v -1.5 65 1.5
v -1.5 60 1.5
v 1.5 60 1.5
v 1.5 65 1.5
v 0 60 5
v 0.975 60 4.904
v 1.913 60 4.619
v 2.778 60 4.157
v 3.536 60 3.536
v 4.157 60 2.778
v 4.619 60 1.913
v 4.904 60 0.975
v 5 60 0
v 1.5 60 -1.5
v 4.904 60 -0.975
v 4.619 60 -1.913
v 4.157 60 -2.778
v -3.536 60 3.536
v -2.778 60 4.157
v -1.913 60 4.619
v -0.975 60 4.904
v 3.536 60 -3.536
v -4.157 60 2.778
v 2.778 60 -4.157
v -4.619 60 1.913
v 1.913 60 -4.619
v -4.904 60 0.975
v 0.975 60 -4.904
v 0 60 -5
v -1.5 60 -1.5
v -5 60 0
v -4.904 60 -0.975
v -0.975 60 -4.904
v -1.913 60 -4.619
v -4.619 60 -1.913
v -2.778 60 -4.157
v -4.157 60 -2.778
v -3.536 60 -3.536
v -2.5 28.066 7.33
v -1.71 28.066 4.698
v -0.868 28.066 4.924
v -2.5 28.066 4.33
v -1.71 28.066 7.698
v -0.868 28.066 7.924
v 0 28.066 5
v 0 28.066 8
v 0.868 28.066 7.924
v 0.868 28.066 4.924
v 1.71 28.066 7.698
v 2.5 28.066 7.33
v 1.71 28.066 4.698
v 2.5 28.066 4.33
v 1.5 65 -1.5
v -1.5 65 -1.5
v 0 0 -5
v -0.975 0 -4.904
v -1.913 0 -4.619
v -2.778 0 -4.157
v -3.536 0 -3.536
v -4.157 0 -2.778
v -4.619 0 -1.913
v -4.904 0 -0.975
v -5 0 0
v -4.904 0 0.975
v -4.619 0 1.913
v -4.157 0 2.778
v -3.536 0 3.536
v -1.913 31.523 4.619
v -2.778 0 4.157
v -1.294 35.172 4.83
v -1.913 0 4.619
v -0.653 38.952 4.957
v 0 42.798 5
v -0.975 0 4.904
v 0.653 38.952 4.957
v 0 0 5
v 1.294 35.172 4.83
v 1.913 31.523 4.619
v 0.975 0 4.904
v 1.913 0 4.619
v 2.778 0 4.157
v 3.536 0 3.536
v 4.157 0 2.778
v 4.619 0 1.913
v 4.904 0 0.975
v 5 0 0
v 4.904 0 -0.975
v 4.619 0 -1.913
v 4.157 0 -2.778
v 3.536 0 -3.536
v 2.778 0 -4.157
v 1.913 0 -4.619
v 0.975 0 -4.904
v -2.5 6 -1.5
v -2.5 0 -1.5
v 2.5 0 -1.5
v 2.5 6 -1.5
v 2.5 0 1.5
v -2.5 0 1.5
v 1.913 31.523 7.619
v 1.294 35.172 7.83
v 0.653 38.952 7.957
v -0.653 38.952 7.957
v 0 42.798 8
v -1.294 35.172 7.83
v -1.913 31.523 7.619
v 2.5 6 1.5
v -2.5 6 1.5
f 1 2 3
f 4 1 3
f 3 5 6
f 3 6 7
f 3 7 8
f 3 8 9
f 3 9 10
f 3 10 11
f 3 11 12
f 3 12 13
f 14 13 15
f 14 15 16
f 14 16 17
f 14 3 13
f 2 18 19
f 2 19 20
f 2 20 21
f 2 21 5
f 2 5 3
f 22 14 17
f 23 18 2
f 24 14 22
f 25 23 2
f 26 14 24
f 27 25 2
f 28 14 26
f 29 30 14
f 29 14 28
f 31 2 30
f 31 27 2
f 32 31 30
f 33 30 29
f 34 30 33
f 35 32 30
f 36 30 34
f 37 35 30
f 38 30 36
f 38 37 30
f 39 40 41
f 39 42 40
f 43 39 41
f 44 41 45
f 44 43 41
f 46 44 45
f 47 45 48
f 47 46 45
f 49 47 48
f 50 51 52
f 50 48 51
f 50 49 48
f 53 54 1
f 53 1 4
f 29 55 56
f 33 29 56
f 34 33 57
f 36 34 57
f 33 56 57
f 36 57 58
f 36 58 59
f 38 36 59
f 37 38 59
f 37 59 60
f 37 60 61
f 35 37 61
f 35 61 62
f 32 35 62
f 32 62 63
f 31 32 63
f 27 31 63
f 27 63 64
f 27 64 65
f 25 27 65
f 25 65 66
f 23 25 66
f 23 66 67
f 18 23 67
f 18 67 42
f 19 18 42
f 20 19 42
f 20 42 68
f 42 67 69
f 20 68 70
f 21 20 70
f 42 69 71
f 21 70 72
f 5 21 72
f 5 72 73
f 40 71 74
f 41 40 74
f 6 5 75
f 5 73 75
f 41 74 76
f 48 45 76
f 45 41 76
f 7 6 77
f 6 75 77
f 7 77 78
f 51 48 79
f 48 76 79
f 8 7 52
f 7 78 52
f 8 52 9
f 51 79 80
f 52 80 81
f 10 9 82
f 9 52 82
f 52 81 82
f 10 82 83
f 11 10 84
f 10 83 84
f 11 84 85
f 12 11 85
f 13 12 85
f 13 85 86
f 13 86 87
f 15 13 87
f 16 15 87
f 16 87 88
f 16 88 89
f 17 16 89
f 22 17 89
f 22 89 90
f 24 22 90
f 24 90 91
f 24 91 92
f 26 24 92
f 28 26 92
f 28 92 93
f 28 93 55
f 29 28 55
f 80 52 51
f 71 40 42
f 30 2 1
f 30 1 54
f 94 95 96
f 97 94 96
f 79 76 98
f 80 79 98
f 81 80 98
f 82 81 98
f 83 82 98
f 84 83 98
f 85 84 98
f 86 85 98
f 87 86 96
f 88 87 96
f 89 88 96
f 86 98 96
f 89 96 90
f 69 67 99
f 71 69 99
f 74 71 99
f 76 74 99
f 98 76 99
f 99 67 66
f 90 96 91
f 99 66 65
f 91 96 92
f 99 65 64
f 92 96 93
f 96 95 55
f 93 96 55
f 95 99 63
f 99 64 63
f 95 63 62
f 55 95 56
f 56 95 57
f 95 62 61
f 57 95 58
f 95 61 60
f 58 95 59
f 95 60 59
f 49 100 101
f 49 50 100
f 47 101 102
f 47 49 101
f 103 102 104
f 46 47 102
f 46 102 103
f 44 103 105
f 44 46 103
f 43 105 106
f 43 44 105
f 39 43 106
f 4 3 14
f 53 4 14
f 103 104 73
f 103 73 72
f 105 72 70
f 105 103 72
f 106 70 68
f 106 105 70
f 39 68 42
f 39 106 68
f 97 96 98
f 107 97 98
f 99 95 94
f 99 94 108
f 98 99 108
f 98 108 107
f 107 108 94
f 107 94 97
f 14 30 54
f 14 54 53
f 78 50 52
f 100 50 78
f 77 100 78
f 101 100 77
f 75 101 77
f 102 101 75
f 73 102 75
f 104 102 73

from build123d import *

# Parameters (mm, degrees)
SKETCH1_R                  = 5
BOSS_EXTRUDE1_DEPTH        = 60
SKETCH2_W                  = 5
SKETCH2_H                  = 3
CUT_EXTRUDE1_DEPTH         = 6
BOSS_EXTRUDE2_REACH        = 65.415
BOSS_EXTRUDE2_START_RADIUS = 5
BOSS_EXTRUDE2_END_RADIUS   = 5
SKETCH4_W                  = 3
SKETCH4_H                  = 3
BOSS_EXTRUDE3_DEPTH        = 5


with BuildPart() as part:
    # Sketch1 → Boss-Extrude1 (new body)
    with BuildSketch(Plane(origin=(0, 0, 0), x_dir=(1, 0, 0), z_dir=(0, 1, 0))):
        Circle(SKETCH1_R)
    extrude(amount=BOSS_EXTRUDE1_DEPTH)

    # Sketch2 → Cut-Extrude1 (cut)
    with BuildSketch(Plane.XZ):
        Rectangle(SKETCH2_W, SKETCH2_H)
    extrude(amount=-CUT_EXTRUDE1_DEPTH, mode=Mode.SUBTRACT)

    # Boss-Extrude2: from a cylinder face, 65.415 long prism both ways, kept between that surface and its translate by the depth
    boss_extrude2_start = Plane(origin=(0, 32.976643, 0), z_dir=(0, -1, 0)) * Cylinder(BOSS_EXTRUDE2_START_RADIUS, 141.83, mode=Mode.PRIVATE)
    boss_extrude2_end = Plane(origin=(0, 32.976643, 3), z_dir=(0, -1, 0)) * Cylinder(BOSS_EXTRUDE2_END_RADIUS, 141.83, mode=Mode.PRIVATE)
    # Sketch3 → Boss-Extrude2 (add, from a surface)
    with BuildSketch(Plane.XY, mode=Mode.PRIVATE) as boss_extrude2_sk1:
        Polygon((0, 42.798210841), (-2.5, 28.065858852), (2.5, 28.065858852), align=None)
    boss_extrude2_tool1 = extrude(boss_extrude2_sk1.sketch, amount=BOSS_EXTRUDE2_REACH, both=True, mode=Mode.PRIVATE)
    add(((boss_extrude2_tool1 - boss_extrude2_start) & boss_extrude2_end).solids().sort_by_distance((0, 60, 5))[0])

    # Sketch4 → Boss-Extrude3 (add)
    with BuildSketch(Plane(origin=(0, 60, 0), x_dir=(1, 0, 0), z_dir=(0, 1, 0))):
        Rectangle(SKETCH4_W, SKETCH4_H)
    extrude(amount=BOSS_EXTRUDE3_DEPTH)


solid = part.part
